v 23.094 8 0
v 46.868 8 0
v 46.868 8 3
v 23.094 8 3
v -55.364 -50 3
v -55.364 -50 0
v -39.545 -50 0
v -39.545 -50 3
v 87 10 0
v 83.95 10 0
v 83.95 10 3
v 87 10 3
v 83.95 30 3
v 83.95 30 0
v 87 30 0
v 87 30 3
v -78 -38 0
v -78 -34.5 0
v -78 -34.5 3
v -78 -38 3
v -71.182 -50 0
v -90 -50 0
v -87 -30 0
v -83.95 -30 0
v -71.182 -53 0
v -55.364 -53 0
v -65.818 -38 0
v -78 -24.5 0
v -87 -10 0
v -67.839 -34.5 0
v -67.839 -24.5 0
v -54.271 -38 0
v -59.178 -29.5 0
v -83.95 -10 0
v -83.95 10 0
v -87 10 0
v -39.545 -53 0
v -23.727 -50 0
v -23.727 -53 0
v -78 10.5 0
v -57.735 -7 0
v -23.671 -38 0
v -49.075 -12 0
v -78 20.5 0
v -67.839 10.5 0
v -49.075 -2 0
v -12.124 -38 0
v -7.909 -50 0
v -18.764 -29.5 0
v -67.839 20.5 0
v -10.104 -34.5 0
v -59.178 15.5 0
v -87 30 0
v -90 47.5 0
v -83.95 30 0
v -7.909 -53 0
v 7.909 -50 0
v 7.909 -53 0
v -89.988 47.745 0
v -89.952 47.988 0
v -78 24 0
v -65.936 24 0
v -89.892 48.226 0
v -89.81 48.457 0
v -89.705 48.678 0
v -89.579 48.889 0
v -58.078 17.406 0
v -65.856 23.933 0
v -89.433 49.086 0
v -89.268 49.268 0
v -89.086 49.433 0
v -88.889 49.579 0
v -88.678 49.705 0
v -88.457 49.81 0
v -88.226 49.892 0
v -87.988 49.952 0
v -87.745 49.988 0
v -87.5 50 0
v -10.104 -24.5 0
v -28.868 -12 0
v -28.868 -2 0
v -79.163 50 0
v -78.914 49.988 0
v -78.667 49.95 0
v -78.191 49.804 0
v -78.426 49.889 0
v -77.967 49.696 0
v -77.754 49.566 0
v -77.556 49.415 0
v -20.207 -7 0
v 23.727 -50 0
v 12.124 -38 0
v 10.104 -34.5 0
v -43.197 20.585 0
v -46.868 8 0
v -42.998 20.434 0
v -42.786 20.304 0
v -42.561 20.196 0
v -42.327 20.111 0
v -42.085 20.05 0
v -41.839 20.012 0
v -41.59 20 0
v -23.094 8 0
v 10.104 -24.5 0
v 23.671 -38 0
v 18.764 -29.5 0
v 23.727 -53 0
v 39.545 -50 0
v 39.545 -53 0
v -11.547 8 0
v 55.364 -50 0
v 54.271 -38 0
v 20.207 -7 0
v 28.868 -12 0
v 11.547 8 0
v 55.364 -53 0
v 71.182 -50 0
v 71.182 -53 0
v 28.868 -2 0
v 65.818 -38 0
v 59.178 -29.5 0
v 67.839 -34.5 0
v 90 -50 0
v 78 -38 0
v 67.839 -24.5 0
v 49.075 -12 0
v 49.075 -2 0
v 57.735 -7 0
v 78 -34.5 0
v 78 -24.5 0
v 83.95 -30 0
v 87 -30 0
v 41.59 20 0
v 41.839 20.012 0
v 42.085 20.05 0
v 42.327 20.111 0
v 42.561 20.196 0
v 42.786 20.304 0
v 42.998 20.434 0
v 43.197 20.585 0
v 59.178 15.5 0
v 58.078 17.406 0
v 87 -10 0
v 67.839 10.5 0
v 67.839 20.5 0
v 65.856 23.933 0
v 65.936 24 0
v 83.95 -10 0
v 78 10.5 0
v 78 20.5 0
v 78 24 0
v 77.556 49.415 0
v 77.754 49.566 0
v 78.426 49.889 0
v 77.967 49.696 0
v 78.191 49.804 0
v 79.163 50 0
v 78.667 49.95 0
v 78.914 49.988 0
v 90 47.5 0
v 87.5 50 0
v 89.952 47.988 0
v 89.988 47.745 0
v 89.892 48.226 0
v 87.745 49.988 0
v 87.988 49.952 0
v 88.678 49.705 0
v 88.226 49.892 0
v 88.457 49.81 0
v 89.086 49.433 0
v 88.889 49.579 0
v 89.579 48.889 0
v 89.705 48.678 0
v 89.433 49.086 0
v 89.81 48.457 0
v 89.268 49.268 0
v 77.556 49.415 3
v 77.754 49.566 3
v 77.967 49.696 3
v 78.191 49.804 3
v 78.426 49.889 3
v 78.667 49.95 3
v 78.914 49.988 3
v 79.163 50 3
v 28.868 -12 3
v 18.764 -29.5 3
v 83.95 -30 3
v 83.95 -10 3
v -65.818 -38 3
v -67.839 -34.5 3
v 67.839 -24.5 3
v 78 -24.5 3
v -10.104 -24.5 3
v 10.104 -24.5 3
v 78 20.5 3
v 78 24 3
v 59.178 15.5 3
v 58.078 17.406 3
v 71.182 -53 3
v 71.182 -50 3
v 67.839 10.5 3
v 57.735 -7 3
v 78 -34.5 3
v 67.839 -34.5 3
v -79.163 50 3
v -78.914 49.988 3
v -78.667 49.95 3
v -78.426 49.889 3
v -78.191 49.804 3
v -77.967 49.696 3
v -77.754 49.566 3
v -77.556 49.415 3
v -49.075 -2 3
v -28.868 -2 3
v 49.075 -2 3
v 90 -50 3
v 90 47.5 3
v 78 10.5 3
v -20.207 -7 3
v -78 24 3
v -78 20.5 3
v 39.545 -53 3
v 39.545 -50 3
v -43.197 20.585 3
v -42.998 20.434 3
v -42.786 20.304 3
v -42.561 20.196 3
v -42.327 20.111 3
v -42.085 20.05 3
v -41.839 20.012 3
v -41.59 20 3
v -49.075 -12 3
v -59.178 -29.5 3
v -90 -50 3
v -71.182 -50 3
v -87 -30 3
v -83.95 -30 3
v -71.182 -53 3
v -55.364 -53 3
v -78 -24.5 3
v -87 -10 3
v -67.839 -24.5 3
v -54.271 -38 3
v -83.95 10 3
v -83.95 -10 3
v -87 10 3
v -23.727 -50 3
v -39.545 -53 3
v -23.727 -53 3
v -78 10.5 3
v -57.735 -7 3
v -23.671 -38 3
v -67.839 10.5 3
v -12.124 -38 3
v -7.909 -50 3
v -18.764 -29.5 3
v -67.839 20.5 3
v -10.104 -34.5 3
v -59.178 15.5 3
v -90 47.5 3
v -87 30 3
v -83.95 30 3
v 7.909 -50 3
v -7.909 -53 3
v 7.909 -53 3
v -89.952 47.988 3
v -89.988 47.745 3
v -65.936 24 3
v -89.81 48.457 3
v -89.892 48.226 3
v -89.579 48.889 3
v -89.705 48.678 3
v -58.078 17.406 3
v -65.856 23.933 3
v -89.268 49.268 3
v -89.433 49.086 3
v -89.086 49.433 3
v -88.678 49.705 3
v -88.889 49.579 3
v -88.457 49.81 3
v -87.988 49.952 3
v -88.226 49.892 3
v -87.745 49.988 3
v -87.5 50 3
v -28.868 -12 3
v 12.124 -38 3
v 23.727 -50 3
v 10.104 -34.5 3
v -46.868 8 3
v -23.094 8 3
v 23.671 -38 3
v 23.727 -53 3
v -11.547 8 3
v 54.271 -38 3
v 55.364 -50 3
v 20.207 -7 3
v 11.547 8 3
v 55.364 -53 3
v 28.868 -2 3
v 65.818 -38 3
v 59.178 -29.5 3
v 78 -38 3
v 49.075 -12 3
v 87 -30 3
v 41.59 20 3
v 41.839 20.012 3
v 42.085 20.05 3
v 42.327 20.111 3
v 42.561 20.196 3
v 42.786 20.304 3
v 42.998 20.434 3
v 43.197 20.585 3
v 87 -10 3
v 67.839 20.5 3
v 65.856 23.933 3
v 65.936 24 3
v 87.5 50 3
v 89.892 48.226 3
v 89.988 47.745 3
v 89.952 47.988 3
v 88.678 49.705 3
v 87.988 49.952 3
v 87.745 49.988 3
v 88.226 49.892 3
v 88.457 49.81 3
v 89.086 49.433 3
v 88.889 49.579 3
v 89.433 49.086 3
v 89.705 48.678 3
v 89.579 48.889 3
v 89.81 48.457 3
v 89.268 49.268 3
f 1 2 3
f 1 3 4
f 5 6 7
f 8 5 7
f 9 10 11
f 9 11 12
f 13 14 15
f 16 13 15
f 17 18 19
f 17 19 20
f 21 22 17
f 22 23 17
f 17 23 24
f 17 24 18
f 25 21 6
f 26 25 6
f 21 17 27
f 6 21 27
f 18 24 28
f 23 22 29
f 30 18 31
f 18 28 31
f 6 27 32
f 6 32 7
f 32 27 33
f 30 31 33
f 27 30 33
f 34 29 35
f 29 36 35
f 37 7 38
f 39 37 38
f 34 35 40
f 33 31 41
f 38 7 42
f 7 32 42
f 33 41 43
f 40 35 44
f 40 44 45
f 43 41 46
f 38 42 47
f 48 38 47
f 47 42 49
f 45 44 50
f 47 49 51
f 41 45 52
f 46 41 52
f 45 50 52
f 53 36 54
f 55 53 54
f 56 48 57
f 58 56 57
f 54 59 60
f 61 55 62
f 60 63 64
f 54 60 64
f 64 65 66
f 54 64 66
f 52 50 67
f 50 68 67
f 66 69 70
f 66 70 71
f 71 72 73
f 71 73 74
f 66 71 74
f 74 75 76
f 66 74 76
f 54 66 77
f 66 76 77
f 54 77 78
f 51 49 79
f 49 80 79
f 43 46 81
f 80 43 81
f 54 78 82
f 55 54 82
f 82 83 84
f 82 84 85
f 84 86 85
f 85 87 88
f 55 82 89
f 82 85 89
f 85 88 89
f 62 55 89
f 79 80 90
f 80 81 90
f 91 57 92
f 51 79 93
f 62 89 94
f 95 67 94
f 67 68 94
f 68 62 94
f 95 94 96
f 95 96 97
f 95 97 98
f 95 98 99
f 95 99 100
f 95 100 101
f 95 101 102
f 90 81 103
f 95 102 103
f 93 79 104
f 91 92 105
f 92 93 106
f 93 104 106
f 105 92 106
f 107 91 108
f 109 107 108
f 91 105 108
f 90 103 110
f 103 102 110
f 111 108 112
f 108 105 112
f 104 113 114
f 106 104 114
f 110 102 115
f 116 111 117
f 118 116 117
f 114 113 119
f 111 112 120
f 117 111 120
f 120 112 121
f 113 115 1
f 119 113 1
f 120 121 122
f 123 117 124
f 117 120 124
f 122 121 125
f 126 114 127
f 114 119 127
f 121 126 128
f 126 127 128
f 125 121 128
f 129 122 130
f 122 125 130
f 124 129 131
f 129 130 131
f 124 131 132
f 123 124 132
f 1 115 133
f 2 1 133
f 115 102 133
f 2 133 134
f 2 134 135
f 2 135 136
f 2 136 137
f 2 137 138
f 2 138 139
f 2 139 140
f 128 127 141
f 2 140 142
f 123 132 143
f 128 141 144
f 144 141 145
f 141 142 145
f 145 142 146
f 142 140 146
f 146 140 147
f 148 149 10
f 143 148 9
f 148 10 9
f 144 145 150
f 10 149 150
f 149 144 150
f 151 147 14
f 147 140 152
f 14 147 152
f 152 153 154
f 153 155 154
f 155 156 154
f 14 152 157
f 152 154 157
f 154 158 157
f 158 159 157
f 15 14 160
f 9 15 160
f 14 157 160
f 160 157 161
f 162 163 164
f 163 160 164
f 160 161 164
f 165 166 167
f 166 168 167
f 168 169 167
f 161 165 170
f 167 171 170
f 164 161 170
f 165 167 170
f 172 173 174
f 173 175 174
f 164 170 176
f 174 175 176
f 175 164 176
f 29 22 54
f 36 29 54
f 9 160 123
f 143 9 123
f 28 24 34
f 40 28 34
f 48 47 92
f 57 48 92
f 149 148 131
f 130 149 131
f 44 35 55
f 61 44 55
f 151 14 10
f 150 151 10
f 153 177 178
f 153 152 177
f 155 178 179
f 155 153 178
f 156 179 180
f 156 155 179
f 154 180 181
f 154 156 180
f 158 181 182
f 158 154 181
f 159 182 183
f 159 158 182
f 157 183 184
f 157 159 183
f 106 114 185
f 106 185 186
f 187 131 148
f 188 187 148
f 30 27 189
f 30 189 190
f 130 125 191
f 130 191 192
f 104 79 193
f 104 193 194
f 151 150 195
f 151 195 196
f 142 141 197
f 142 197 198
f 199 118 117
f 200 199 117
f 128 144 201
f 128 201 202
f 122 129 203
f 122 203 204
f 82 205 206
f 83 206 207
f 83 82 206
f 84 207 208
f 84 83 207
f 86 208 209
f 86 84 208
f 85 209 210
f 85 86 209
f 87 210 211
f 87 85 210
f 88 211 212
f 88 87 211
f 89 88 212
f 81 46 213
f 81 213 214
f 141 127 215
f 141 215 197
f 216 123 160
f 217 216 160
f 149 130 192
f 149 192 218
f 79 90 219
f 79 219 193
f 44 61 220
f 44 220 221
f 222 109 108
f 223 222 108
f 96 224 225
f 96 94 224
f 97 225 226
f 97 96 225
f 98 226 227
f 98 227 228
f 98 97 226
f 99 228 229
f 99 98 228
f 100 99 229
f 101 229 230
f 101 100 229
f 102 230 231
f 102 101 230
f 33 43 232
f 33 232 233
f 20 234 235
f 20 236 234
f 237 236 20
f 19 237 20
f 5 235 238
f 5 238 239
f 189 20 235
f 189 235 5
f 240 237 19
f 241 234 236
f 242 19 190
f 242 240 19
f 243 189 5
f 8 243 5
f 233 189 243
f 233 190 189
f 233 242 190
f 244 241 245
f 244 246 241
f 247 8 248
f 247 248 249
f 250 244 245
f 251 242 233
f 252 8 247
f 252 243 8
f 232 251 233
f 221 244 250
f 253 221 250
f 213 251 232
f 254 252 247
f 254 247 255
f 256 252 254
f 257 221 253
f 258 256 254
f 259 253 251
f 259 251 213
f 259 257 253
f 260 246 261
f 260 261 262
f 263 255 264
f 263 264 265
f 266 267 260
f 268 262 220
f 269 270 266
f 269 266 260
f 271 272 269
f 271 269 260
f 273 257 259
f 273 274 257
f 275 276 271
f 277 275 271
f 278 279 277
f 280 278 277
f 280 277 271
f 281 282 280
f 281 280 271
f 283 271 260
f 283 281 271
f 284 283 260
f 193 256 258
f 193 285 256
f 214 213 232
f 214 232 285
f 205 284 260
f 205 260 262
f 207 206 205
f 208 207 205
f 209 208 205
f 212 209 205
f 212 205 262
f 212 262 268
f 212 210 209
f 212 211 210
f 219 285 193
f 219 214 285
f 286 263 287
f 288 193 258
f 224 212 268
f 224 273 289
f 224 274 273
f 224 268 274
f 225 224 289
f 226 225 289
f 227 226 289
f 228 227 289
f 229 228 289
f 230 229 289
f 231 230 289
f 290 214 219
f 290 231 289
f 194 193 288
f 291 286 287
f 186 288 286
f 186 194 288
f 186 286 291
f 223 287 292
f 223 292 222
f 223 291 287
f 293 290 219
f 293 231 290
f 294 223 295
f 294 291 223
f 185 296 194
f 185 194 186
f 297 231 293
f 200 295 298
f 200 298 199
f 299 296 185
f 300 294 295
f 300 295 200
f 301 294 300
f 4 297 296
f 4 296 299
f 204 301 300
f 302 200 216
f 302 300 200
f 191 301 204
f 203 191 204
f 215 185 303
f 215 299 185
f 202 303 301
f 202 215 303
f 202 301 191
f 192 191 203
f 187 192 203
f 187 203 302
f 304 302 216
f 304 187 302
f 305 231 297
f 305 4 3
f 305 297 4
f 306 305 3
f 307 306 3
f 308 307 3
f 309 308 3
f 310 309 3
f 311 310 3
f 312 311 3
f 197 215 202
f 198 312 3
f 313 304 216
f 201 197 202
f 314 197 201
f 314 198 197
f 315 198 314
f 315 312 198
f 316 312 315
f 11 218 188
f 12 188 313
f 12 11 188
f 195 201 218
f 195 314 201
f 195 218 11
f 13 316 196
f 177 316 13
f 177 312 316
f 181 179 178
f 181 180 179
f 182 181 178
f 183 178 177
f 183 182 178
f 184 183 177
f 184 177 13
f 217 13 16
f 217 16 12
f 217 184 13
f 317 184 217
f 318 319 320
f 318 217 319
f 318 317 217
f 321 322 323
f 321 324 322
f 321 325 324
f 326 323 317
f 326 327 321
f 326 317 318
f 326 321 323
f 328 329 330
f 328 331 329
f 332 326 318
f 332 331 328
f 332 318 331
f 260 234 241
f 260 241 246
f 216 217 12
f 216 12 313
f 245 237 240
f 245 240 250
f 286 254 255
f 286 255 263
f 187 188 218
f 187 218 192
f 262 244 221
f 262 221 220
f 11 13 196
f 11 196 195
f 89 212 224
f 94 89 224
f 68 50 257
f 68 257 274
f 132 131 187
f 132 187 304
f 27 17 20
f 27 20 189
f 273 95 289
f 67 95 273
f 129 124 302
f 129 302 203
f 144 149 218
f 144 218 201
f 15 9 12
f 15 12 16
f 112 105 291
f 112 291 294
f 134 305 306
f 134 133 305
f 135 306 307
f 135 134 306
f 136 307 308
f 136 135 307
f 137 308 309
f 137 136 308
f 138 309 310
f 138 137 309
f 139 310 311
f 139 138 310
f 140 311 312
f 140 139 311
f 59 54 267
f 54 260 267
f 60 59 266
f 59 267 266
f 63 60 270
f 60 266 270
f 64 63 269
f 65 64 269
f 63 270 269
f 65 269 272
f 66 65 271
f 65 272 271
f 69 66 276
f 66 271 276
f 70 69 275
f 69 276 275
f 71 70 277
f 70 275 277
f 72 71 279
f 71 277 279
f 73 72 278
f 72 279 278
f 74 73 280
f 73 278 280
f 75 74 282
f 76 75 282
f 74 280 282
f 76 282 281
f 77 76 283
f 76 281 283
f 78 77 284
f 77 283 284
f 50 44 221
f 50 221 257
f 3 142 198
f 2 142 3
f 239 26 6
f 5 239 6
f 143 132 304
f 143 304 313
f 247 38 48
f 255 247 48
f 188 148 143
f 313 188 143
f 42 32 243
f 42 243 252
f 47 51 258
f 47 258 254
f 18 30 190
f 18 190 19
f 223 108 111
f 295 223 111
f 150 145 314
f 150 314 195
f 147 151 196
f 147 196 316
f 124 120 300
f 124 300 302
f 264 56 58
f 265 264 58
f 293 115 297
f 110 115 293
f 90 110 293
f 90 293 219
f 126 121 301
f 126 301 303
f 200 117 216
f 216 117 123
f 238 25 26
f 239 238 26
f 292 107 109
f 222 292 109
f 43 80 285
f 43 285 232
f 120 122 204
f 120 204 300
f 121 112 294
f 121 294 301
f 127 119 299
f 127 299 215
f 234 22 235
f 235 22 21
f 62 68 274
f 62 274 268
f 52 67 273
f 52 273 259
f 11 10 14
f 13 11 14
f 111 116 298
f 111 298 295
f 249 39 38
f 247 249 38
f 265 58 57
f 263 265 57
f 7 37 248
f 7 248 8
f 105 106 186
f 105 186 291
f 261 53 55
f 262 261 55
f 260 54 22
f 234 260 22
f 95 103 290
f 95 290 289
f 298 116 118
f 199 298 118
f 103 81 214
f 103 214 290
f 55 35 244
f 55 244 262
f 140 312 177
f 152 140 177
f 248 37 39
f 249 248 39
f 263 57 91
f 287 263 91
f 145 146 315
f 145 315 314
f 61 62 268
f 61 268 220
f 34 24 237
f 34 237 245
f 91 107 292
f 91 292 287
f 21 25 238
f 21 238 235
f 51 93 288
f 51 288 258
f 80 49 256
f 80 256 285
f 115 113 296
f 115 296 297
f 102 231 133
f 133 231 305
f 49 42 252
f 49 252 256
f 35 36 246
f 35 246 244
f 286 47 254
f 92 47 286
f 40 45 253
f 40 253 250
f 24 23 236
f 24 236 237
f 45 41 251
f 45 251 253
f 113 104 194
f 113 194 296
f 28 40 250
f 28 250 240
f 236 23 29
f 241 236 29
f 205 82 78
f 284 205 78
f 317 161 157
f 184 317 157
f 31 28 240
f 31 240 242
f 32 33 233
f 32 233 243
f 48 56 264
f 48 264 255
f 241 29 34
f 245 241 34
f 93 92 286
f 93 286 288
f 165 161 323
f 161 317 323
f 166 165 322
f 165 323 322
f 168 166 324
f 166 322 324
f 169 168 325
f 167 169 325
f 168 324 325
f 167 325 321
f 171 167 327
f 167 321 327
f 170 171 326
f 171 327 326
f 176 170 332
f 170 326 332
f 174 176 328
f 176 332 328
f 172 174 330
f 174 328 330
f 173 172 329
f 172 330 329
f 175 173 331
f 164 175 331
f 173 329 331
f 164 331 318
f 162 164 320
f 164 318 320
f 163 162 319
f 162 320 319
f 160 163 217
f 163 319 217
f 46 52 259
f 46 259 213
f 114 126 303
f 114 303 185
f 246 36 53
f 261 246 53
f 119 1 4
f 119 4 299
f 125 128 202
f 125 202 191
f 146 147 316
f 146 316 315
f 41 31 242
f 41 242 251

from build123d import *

# Parameters (mm, degrees)
SKETCH1_W               = 3.05
SKETCH1_H               = 20
SKETCH1_W_2             = 15.818181818
SKETCH1_H_2             = 3
BOSS_EXTRUDE1_DEPTH     = 3
CUT_EXTRUDE9_DEPTH      = 1
CUT_EXTRUDE9_DEPTH_BACK = 4
FILLET3_R               = 2.5
CUT_EXTRUDE8_DEPTH      = 4
CUT_EXTRUDE8_DEPTH_BACK = 1


with BuildPart() as part:
    # Sketch1 → Boss-Extrude1 (new body)
    with BuildSketch(Plane.XY):
        Polygon((-90, 50), (-90, -50), (-71.181818182, -50), (-55.363636364, -50), (-39.545454545, -50), (-23.727272727, -50), (-7.909090909, -50), (7.909090909, -50), (23.727272727, -50), (39.545454545, -50), (55.363636364, -50), (71.181818182, -50), (90, -50), (90, 50), align=None)
        with Locations((-85.475, -20)):
            Rectangle(SKETCH1_W, SKETCH1_H, mode=Mode.SUBTRACT)
        with Locations((85.475, -20)):
            Rectangle(SKETCH1_W, SKETCH1_H, mode=Mode.SUBTRACT)
        with Locations((-85.475, 20)):
            Rectangle(SKETCH1_W, SKETCH1_H, mode=Mode.SUBTRACT)
        with Locations((85.475, 20)):
            Rectangle(SKETCH1_W, SKETCH1_H, mode=Mode.SUBTRACT)
        with Locations((-63.272727273, -51.5)):
            Rectangle(SKETCH1_W_2, SKETCH1_H_2)
        with Locations((-31.636363636, -51.5)):
            Rectangle(SKETCH1_W_2, SKETCH1_H_2)
        with Locations((0, -51.5)):
            Rectangle(SKETCH1_W_2, SKETCH1_H_2)
        with Locations((31.636363636, -51.5)):
            Rectangle(SKETCH1_W_2, SKETCH1_H_2)
        with Locations((63.272727273, -51.5)):
            Rectangle(SKETCH1_W_2, SKETCH1_H_2)
    extrude(amount=BOSS_EXTRUDE1_DEPTH)

    # Sketch7 → Cut-Extrude9 (cut, two sides)
    with BuildSketch(Plane.XY.offset(3)) as cut_extrude9_sk:
        Polygon((-78.252607778, 50), (-42.5, 20), (42.5, 20), (78.252607778, 50), align=None)
    extrude(amount=CUT_EXTRUDE9_DEPTH, mode=Mode.SUBTRACT)
    extrude(cut_extrude9_sk.sketch, amount=-CUT_EXTRUDE9_DEPTH_BACK, mode=Mode.SUBTRACT)

    # Fillet3
    fillet3_edges = [part.edges().sort_by_distance(p)[0] for p in [
        (-78.252607778, 50, 1.5),
        (78.252607778, 50, 1.5),
        (42.5, 20, 1.5),
        (-42.5, 20, 1.5),
        (-90, 50, 1.5),
        (90, 50, 1.5),
    ]]
    fillet(fillet3_edges, radius=FILLET3_R)

    # Sketch6 → Cut-Extrude8 (cut, two sides)
    with BuildSketch(Plane.XY) as cut_extrude8_sk:
        Polygon((-67.83865663, 10.5), (-78, 10.5), (-78, -24.5), (-67.83865663, -24.5), (-57.735026919, -7), align=None)
        Polygon((-59.178402592, -29.5), (-54.270925304, -38), (-23.671361037, -38), (-18.763883749, -29.5), (-28.867513459, -12), (-49.074772881, -12), align=None)
        Polygon((-67.83865663, -34.5), (-78, -34.5), (-78, -38), (-65.817930688, -38), align=None)
        Polygon((-10.103629711, -34.5), (-12.124355653, -38), (12.124355653, -38), (10.103629711, -34.5), align=None)
        Polygon((18.763883749, -29.5), (23.671361037, -38), (54.270925304, -38), (59.178402592, -29.5), (49.074772881, -12), (28.867513459, -12), align=None)
        Polygon((78, -38), (78, -34.5), (67.83865663, -34.5), (65.817930688, -38), align=None)
        Polygon((78, -24.5), (78, 10.5), (67.83865663, 10.5), (57.735026919, -7), (67.83865663, -24.5), align=None)
        Polygon((11.547005384, 8), (-11.547005384, 8), (-20.207259422, -7), (-10.103629711, -24.5), (10.103629711, -24.5), (20.207259422, -7), align=None)
        Polygon((-46.867642811, 8), (-58.077745879, 17.406393349), (-59.178402592, 15.5), (-49.074772881, -2), (-28.867513459, -2), (-23.094010768, 8), align=None)
        Polygon((46.867642811, 8), (23.094010768, 8), (28.867513459, -2), (49.074772881, -2), (59.178402592, 15.5), (58.077745879, 17.406393349), align=None)
        Polygon((-67.83865663, 20.5), (-65.856365013, 23.933429796), (-65.935700293, 24), (-78, 24), (-78, 20.5), align=None)
        Polygon((65.935700293, 24), (65.856365013, 23.933429796), (67.83865663, 20.5), (78, 20.5), (78, 24), align=None)
    extrude(amount=CUT_EXTRUDE8_DEPTH, mode=Mode.SUBTRACT)
    extrude(cut_extrude8_sk.sketch, amount=-CUT_EXTRUDE8_DEPTH_BACK, mode=Mode.SUBTRACT)


solid = part.part
